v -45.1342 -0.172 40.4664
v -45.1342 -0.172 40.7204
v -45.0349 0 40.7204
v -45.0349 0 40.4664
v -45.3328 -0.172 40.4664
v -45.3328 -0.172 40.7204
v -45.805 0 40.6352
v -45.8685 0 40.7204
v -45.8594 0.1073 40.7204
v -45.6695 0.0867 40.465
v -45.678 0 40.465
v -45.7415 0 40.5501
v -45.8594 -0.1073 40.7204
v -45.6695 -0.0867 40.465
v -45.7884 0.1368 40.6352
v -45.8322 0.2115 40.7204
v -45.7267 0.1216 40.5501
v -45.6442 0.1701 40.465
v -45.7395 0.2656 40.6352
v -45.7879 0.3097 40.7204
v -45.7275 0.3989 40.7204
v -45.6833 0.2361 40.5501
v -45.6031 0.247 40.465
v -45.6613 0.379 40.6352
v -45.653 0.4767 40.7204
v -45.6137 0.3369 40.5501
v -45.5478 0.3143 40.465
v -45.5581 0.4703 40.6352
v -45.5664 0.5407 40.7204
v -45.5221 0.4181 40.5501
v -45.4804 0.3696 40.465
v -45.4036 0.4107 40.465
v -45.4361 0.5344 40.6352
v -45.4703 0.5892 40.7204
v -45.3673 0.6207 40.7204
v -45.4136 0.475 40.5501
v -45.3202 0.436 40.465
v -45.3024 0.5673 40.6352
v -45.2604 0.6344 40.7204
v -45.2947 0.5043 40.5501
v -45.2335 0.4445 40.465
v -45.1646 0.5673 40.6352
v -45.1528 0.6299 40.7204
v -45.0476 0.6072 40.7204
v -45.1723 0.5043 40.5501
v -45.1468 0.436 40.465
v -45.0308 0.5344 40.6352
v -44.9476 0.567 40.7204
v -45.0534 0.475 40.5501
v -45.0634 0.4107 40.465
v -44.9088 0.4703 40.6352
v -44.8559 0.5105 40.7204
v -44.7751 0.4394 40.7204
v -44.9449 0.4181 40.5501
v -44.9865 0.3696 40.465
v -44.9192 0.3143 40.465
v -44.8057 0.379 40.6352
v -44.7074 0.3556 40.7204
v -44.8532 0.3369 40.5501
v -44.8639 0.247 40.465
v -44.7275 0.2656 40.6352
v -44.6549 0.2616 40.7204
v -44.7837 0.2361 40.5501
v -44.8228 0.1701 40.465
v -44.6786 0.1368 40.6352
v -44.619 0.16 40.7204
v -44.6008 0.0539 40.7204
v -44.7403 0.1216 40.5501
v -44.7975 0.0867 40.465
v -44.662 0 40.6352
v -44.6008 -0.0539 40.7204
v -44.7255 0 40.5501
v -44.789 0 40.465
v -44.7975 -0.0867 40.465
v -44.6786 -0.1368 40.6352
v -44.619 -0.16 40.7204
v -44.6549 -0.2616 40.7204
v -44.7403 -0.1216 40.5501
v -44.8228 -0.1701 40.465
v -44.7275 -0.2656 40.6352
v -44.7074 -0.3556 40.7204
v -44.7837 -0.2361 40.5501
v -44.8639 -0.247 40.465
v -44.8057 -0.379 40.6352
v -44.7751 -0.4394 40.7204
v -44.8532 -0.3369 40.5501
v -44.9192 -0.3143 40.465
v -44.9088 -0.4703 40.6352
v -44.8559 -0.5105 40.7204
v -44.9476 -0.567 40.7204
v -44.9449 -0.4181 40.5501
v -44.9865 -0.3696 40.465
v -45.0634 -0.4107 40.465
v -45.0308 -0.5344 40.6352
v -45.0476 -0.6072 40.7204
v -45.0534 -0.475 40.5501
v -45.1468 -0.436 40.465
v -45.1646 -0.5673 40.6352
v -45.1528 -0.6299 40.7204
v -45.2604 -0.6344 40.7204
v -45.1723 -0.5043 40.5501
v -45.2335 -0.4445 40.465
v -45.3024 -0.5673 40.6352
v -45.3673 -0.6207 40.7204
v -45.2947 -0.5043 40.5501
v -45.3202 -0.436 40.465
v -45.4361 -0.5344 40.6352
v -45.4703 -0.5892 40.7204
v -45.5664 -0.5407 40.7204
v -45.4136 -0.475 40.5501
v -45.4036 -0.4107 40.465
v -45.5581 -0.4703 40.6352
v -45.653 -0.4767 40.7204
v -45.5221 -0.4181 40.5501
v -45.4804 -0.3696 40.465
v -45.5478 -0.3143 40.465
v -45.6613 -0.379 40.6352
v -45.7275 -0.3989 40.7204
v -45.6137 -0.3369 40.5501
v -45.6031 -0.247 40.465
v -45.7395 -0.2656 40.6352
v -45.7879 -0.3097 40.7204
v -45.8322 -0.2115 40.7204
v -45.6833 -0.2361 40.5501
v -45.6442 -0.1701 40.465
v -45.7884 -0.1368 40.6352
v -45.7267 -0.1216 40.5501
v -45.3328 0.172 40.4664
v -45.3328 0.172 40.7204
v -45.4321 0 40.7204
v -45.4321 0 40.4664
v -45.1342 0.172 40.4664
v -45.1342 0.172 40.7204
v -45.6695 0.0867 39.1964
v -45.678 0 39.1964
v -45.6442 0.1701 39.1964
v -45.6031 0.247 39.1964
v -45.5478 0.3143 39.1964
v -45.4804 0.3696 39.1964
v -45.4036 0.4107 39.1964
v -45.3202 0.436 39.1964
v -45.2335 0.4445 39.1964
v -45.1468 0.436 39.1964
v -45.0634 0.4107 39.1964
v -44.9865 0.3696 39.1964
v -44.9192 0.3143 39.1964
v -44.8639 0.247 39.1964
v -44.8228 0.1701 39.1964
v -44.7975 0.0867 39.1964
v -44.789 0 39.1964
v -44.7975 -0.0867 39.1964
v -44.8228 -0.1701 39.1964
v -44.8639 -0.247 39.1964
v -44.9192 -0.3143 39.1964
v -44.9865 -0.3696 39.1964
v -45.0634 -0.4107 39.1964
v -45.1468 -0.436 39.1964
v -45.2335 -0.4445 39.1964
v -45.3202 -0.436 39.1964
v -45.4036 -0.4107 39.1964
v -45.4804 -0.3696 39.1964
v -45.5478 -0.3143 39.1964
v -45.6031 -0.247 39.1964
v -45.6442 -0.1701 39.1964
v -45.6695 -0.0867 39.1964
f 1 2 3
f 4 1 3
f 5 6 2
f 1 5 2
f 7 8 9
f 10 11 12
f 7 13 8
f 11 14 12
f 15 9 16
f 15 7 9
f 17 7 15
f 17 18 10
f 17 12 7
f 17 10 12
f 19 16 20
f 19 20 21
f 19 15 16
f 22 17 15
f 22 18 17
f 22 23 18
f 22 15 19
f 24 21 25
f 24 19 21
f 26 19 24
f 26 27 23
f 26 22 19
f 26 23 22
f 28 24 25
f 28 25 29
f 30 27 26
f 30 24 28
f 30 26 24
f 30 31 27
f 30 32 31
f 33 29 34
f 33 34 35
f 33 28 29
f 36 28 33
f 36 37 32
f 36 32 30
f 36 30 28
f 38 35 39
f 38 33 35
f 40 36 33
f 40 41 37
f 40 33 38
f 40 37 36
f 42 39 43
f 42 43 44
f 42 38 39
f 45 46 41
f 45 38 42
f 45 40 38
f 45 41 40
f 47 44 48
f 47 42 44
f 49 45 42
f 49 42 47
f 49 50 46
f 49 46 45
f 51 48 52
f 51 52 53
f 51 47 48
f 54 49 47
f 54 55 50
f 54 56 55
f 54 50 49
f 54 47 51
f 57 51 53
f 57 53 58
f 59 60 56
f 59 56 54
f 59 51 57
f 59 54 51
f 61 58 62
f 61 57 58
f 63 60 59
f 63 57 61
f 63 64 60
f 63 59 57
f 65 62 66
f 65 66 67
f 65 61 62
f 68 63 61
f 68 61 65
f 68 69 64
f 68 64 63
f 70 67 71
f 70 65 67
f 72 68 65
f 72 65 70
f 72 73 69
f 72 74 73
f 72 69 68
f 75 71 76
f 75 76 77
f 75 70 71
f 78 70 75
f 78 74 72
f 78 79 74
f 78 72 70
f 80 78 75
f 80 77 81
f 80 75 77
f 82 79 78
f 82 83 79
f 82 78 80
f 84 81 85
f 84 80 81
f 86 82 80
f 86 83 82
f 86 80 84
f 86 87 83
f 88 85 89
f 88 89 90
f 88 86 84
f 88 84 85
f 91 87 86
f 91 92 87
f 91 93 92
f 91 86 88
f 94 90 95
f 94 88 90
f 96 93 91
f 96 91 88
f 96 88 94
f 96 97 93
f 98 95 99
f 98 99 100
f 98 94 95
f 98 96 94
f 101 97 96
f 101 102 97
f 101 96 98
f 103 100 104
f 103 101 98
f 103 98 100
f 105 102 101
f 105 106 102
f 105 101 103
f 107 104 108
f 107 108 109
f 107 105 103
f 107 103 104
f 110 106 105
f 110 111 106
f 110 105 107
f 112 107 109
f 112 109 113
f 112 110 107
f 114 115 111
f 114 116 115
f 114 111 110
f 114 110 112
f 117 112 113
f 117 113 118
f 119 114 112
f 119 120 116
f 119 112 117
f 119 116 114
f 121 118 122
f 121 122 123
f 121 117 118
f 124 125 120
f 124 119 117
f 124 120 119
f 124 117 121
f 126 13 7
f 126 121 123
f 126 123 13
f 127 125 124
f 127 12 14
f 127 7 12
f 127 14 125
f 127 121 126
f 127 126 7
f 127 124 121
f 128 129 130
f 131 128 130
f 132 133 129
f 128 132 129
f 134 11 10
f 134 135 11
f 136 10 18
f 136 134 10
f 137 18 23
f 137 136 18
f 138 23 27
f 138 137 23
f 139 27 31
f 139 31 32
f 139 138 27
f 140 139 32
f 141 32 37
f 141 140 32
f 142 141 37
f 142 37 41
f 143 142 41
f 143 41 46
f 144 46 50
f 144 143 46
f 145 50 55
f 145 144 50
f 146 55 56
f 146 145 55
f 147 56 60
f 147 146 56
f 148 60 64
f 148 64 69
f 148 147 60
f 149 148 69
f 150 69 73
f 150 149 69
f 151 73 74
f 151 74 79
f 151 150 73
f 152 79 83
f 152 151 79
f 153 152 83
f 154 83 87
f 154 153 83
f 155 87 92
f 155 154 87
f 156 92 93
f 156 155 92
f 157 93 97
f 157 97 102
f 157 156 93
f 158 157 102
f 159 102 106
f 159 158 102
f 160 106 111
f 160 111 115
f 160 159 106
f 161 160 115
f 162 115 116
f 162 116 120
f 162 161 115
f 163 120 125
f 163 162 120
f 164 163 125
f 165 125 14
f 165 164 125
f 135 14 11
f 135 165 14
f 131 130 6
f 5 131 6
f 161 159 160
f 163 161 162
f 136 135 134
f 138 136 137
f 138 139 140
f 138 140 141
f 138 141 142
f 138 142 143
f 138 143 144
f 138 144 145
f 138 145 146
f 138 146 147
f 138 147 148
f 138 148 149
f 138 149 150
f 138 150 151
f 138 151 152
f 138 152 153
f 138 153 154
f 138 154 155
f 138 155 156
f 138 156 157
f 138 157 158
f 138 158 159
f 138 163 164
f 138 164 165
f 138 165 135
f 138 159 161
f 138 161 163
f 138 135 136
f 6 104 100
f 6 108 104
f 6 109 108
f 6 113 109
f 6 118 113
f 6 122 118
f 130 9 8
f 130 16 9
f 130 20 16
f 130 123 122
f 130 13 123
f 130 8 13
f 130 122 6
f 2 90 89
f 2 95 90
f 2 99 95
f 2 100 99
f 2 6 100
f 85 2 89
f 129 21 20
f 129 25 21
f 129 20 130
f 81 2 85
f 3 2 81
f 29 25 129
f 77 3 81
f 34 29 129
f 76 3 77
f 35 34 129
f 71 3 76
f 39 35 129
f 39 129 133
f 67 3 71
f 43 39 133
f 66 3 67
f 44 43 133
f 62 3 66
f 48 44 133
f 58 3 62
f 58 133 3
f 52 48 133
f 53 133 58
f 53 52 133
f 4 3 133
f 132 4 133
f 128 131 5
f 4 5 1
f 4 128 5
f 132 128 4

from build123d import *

# Parameters (mm, degrees)
F3_DEPTH = 0.254


# Not quite as in the source:
# - a feature names something its author has since deleted; it is built from what else it names


with BuildPart() as f1:
    # F0 (on Front) → F1 (revolve)
    with BuildSketch(Plane.XZ):
        Polygon((-45.2334927974, 40.7203510404), (-45.8684927974, 40.7203510404), (-45.6779927974, 40.4649959532), (-45.6779927974, 39.1963510404), (-45.2334927974, 39.1963510404), align=None)
    revolve(axis=Axis((-45.2334927974, 0, 39.9583510404), (0, 0, -1)))

    # F2 (on face) → F3 (cut)
    with BuildSketch(Plane.XY.offset(40.7203510404)):
        Polygon((-45.1342007585, 0.1719788561), (-45.3327848362, 0.1719788561), (-45.4320768751, 0), (-45.3327848362, -0.1719788561), (-45.1342007585, -0.1719788561), (-45.0349087197, 0), align=None)
    extrude(amount=-F3_DEPTH, mode=Mode.SUBTRACT)


solid = f1.part
